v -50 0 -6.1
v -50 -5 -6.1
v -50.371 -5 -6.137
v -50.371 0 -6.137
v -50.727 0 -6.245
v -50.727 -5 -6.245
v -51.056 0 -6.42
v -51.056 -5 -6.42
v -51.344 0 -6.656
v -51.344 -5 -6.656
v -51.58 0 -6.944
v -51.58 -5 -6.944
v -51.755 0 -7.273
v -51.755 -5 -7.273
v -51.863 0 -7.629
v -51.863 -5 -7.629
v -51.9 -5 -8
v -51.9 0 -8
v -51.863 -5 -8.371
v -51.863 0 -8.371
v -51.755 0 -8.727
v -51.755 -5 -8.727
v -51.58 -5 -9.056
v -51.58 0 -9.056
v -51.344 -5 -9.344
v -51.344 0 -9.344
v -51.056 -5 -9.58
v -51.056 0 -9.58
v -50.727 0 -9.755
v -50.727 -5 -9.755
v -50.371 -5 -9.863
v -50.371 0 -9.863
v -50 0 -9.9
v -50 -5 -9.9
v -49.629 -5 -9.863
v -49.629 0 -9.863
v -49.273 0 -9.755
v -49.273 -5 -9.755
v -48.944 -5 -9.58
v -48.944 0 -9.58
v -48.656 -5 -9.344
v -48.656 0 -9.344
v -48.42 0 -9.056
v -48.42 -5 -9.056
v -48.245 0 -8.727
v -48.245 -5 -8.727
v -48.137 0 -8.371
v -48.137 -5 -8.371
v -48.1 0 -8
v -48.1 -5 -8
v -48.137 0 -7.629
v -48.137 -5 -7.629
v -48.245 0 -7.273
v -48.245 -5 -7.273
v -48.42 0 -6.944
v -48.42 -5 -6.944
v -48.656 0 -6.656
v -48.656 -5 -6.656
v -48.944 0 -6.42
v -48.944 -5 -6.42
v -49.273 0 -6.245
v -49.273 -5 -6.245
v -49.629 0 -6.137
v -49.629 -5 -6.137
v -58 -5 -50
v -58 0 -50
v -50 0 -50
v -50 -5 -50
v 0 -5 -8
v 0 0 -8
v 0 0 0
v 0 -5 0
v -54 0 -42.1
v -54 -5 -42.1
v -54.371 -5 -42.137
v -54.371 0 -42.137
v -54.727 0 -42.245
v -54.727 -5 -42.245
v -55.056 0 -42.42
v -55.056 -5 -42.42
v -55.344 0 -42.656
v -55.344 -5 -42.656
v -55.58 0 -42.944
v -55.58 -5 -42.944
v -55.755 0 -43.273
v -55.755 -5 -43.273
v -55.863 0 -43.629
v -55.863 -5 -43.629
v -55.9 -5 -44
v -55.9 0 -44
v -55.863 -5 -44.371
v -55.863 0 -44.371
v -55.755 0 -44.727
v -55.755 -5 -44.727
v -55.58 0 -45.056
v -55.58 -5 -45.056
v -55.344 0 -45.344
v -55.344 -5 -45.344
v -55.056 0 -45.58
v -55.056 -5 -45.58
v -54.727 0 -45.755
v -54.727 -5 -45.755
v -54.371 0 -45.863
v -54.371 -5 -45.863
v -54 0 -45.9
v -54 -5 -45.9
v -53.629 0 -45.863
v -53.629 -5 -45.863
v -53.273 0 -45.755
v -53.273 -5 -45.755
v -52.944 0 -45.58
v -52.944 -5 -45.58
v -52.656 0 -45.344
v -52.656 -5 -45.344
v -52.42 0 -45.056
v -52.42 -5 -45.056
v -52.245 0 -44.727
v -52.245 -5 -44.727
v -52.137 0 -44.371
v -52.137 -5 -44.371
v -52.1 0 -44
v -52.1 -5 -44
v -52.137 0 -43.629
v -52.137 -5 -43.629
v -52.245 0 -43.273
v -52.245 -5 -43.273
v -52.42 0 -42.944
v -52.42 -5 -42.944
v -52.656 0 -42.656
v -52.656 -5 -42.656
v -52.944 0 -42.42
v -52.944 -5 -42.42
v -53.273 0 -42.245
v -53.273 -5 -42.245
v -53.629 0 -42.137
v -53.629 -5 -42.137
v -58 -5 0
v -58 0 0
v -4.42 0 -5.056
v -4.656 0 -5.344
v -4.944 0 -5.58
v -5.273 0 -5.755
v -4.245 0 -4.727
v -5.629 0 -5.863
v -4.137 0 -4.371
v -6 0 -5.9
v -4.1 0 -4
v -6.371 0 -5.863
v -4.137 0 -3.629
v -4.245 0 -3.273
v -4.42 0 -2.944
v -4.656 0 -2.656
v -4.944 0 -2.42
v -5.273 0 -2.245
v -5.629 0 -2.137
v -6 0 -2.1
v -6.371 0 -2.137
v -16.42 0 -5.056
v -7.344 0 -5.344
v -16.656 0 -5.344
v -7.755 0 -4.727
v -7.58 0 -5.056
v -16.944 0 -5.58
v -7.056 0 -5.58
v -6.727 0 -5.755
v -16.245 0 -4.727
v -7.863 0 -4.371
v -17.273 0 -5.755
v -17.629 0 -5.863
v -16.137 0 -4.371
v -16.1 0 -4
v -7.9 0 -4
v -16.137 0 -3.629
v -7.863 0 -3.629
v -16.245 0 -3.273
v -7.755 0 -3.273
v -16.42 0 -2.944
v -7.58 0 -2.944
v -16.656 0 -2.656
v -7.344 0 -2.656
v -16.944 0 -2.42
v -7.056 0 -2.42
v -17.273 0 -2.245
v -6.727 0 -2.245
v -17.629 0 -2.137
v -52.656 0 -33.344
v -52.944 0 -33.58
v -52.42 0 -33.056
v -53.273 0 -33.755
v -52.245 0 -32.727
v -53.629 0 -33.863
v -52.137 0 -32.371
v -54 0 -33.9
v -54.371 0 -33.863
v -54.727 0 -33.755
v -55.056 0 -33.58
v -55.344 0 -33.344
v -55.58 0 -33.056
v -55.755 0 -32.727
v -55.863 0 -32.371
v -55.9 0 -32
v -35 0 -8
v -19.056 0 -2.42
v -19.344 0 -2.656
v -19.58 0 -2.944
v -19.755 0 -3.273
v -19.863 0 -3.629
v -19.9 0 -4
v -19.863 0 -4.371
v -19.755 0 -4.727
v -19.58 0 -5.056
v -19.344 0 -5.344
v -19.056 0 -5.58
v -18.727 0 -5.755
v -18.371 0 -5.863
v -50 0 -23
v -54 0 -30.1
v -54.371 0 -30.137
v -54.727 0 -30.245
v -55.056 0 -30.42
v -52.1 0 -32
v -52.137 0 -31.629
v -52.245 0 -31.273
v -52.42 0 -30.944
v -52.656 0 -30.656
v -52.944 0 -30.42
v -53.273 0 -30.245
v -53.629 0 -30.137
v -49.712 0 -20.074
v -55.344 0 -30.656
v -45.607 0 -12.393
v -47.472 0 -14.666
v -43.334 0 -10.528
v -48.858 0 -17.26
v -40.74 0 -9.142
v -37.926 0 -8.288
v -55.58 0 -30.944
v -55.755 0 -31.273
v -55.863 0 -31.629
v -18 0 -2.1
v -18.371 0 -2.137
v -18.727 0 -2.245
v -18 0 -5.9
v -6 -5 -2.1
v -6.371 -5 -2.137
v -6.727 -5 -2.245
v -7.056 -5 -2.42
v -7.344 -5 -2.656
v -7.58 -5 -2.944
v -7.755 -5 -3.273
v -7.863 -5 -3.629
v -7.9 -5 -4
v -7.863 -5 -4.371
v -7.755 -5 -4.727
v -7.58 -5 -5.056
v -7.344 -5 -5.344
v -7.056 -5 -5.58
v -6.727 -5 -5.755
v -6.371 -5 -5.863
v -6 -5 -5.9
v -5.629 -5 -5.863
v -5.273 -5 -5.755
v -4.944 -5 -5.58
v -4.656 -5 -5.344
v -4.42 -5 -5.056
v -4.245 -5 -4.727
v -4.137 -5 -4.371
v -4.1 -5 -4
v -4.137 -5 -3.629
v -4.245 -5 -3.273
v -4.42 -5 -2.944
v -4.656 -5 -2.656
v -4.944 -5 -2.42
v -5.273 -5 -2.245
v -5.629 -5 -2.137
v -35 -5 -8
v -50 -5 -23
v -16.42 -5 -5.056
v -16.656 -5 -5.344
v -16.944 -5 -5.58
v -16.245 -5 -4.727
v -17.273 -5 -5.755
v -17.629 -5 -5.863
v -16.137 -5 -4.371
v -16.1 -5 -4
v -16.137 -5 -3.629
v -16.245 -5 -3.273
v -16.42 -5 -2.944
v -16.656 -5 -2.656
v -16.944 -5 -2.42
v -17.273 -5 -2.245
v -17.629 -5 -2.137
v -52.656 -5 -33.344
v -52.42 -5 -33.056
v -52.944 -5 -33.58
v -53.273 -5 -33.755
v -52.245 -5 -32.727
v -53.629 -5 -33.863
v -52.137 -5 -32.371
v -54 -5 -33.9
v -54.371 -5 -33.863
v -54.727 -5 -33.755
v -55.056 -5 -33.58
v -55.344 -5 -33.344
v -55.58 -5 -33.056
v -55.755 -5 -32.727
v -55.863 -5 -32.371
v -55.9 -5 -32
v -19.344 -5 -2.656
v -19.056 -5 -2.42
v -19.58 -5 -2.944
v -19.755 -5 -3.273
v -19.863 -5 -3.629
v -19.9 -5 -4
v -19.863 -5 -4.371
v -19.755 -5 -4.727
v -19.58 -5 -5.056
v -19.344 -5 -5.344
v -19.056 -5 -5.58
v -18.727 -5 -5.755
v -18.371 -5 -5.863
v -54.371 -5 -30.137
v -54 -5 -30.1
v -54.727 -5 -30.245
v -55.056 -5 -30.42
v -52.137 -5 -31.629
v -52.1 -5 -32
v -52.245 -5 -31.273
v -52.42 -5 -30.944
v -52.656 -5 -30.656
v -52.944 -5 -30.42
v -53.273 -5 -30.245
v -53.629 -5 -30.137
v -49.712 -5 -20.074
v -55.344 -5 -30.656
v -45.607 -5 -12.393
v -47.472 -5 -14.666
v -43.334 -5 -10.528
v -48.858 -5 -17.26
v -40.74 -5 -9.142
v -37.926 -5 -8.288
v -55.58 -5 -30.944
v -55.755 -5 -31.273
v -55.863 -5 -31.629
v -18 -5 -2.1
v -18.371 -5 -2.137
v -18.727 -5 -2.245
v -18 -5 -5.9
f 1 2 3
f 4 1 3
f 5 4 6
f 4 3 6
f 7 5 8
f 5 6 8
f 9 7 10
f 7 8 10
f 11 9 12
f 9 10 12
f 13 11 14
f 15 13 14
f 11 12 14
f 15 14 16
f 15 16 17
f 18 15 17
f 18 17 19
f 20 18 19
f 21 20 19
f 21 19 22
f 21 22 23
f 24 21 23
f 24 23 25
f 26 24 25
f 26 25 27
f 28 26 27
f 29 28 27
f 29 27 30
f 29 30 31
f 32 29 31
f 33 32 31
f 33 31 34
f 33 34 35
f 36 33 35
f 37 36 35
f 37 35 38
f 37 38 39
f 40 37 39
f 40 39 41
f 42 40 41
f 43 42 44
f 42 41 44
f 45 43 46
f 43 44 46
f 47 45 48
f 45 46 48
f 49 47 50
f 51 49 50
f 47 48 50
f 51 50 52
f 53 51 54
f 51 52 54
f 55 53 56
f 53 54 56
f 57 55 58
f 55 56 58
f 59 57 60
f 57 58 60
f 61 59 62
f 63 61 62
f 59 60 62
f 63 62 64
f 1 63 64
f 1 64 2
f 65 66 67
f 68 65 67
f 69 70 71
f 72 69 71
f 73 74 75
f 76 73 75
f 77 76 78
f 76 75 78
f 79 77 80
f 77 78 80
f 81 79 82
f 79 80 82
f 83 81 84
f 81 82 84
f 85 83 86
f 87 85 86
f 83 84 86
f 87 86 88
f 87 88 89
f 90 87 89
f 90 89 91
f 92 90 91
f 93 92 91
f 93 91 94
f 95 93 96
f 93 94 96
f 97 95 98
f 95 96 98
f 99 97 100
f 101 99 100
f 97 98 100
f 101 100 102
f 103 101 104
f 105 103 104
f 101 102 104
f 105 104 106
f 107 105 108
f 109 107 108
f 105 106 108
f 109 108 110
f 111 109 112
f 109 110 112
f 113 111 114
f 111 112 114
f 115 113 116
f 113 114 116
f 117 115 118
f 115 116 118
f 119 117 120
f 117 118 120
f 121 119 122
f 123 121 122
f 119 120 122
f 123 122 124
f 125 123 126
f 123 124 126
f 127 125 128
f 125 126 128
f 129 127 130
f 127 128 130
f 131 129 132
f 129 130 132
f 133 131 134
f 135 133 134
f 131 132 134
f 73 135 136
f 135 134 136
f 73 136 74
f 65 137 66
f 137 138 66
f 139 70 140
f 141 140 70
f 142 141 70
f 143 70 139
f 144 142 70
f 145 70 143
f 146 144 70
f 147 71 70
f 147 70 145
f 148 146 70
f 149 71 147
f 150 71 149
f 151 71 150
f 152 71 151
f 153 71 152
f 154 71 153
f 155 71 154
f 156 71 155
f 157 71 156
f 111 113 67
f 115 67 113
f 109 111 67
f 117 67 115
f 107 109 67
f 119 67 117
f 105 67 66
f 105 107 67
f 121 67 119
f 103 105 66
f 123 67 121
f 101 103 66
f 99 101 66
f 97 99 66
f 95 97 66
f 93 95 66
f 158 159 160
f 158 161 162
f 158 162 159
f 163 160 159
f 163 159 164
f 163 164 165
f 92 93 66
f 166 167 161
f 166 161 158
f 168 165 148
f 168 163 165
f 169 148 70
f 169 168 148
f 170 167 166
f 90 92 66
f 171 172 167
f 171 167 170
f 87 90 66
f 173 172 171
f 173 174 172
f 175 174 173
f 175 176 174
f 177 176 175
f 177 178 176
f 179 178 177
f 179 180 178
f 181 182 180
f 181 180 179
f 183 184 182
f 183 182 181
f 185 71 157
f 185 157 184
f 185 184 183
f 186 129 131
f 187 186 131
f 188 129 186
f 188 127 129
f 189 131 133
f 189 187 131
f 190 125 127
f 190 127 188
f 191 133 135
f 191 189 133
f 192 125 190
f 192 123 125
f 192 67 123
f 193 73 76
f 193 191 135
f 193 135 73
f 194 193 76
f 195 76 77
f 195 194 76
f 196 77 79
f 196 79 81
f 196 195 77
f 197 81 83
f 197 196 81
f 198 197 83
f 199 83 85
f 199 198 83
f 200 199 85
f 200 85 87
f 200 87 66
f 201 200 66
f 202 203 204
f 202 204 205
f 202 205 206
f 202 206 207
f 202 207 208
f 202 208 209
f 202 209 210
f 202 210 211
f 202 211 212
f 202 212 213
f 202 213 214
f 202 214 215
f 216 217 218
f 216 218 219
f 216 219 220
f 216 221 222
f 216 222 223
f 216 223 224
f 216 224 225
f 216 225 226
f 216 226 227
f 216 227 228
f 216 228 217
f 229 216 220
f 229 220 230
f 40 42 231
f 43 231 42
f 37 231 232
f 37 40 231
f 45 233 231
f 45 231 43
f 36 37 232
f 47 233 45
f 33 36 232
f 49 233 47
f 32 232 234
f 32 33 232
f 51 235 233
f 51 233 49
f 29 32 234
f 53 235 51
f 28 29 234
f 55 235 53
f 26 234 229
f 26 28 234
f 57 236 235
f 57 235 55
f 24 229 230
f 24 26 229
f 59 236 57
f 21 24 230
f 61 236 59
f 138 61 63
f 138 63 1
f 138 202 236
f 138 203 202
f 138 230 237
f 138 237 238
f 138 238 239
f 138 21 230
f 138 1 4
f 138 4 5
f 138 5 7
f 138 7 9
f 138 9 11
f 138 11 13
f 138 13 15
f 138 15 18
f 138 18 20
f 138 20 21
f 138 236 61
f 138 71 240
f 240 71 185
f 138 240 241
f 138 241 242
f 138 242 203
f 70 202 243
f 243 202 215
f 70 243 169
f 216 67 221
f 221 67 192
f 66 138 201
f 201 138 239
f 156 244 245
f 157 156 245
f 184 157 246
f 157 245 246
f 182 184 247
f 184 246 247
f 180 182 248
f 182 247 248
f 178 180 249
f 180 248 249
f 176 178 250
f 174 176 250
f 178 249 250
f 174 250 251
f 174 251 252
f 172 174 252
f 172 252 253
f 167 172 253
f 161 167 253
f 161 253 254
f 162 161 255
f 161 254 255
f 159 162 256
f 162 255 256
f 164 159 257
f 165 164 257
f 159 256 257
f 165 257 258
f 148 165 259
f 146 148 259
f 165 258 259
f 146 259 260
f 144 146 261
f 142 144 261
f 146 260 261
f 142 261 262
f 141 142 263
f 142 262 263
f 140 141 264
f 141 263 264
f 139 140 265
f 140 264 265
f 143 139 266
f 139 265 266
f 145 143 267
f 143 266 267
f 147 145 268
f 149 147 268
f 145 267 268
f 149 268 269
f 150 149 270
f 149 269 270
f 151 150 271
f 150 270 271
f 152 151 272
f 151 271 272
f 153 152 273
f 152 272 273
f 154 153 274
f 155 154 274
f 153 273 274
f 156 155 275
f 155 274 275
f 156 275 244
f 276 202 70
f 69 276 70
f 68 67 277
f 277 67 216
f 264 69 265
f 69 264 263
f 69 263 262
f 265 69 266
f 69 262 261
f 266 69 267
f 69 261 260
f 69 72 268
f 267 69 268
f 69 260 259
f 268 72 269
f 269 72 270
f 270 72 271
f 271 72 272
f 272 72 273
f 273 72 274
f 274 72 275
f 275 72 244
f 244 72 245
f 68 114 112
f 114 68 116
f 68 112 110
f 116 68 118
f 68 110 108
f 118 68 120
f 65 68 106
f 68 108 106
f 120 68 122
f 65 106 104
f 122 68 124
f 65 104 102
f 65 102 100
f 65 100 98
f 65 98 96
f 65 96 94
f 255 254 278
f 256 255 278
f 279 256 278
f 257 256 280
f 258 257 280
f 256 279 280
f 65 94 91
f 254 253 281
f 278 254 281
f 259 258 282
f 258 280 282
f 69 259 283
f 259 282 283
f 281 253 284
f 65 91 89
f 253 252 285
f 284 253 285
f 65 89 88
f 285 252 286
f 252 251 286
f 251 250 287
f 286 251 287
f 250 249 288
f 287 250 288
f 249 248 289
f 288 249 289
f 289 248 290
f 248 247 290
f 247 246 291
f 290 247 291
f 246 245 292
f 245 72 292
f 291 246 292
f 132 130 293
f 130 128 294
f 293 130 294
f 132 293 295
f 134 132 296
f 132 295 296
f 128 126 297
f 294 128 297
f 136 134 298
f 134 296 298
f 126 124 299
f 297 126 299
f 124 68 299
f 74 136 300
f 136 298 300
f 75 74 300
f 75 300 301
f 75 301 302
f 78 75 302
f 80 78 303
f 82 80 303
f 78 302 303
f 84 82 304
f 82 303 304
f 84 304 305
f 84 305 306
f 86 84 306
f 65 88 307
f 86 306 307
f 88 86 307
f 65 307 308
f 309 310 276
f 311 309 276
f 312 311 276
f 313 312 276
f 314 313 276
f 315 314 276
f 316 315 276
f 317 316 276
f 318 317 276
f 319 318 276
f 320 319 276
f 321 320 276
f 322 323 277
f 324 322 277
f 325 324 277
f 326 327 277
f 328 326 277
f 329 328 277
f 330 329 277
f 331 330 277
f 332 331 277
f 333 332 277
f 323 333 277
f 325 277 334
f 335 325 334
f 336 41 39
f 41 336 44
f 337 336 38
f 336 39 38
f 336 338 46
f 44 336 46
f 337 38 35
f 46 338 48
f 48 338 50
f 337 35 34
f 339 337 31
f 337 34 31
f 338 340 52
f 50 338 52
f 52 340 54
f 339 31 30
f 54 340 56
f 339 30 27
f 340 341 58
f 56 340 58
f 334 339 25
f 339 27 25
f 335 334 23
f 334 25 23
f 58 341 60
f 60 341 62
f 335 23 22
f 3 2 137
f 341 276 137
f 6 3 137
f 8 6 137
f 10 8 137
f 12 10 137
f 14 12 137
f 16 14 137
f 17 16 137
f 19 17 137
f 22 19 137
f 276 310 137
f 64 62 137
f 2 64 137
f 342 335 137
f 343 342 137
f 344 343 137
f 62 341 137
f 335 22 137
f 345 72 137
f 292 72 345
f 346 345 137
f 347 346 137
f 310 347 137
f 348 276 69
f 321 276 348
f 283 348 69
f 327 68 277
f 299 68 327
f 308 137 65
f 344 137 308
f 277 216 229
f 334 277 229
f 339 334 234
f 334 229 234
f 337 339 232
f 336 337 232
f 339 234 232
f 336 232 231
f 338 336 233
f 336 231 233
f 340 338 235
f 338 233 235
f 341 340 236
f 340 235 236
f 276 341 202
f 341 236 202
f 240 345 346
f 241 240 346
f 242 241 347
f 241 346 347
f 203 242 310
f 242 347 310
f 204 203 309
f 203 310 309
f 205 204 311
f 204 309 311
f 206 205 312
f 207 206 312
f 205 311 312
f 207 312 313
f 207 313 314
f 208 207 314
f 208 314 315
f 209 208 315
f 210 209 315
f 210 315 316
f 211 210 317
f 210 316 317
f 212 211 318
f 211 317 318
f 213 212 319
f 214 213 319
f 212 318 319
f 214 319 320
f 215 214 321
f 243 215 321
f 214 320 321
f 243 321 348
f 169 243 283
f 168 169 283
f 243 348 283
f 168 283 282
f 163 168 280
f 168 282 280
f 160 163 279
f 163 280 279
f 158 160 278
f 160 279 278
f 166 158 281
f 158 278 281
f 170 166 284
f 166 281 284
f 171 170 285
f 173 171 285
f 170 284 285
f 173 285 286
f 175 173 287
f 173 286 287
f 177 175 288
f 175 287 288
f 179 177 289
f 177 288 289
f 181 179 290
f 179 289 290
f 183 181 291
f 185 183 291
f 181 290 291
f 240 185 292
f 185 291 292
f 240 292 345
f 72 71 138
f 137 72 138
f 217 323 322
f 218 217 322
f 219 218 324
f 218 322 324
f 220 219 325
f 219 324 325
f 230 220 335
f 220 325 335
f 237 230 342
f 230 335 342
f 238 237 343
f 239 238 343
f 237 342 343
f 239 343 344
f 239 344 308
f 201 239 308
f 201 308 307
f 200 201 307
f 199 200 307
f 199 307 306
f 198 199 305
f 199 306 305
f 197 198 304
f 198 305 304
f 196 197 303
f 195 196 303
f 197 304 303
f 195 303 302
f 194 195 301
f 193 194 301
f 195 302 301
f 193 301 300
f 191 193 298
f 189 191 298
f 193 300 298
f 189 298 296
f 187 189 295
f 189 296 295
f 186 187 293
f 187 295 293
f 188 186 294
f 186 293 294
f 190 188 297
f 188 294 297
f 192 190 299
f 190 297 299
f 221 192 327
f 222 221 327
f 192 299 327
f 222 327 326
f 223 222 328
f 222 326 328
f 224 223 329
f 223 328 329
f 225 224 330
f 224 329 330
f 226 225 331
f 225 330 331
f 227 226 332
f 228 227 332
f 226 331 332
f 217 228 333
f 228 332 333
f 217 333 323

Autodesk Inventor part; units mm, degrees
ref_plane "YZ Plane" through (0, 0, 0) normal (1, 0, 0) x (0, 1, 0)
ref_plane "XZ Plane" through (0, 0, 0) normal (0, 1, 0) x (-1, 0, 0)
ref_plane "XY Plane" through (0, 0, 0) normal (0, 0, 1) x (1, 0, 0)
sketch "Sketch1" plane through (0, 0, 0) normal (0, 1, 0) x (-1, 0, 0)
  line L0 (0, 0) -> (58, 0)
  line L1 (58, 0) -> (58, -50)
  line L2 (58, -50) -> (0, -50)
  line L3 (0, -50) -> (0, 0)
  line L4 (0, -50) -> (50, -50)
  line L5 (50, -50) -> (50, -23)
  line L6 (35, -8) -> (0, -8)
  line L7 (0, -8) -> (0, -50)
  arc A0 (50, -23) -> (35, -8) centre (35, -23) ccw
  line L8 (54, -53.5159) -> (54, 28.6039) construction
  line L9 (-7.6056, -4) -> (76.8297, -4) construction
  point P0 (50, -8)
  point P1 (6, -4)
  point P2 (18, -4)
  point P3 (54, -32)
  point P4 (54, -44)
  point P5 (50, -8)
  dimension "d0" = 58
  dimension "d1" = 50
  dimension "d2" = 50
  dimension "d3" = 42
  dimension "d4" = 15
  dimension "d5" = 6
  dimension "d6" = 18
  dimension "d7" = 18
  dimension "d8" = 6
extrude "Extrusion1" add sketch "Sketch1" against normal blind 5 contours L0 L1 L2 L5 A0 L6 L3
hole "Hole1" at (-6, 0, -4) at (-18, 0, -4) at (-54, 0, -32) at (-54, 0, -44) at (-50, 0, -8) direction (0, -1, 0) diameter 3.8 end through all
properties part number "Step-back spacer -electronics enc"
